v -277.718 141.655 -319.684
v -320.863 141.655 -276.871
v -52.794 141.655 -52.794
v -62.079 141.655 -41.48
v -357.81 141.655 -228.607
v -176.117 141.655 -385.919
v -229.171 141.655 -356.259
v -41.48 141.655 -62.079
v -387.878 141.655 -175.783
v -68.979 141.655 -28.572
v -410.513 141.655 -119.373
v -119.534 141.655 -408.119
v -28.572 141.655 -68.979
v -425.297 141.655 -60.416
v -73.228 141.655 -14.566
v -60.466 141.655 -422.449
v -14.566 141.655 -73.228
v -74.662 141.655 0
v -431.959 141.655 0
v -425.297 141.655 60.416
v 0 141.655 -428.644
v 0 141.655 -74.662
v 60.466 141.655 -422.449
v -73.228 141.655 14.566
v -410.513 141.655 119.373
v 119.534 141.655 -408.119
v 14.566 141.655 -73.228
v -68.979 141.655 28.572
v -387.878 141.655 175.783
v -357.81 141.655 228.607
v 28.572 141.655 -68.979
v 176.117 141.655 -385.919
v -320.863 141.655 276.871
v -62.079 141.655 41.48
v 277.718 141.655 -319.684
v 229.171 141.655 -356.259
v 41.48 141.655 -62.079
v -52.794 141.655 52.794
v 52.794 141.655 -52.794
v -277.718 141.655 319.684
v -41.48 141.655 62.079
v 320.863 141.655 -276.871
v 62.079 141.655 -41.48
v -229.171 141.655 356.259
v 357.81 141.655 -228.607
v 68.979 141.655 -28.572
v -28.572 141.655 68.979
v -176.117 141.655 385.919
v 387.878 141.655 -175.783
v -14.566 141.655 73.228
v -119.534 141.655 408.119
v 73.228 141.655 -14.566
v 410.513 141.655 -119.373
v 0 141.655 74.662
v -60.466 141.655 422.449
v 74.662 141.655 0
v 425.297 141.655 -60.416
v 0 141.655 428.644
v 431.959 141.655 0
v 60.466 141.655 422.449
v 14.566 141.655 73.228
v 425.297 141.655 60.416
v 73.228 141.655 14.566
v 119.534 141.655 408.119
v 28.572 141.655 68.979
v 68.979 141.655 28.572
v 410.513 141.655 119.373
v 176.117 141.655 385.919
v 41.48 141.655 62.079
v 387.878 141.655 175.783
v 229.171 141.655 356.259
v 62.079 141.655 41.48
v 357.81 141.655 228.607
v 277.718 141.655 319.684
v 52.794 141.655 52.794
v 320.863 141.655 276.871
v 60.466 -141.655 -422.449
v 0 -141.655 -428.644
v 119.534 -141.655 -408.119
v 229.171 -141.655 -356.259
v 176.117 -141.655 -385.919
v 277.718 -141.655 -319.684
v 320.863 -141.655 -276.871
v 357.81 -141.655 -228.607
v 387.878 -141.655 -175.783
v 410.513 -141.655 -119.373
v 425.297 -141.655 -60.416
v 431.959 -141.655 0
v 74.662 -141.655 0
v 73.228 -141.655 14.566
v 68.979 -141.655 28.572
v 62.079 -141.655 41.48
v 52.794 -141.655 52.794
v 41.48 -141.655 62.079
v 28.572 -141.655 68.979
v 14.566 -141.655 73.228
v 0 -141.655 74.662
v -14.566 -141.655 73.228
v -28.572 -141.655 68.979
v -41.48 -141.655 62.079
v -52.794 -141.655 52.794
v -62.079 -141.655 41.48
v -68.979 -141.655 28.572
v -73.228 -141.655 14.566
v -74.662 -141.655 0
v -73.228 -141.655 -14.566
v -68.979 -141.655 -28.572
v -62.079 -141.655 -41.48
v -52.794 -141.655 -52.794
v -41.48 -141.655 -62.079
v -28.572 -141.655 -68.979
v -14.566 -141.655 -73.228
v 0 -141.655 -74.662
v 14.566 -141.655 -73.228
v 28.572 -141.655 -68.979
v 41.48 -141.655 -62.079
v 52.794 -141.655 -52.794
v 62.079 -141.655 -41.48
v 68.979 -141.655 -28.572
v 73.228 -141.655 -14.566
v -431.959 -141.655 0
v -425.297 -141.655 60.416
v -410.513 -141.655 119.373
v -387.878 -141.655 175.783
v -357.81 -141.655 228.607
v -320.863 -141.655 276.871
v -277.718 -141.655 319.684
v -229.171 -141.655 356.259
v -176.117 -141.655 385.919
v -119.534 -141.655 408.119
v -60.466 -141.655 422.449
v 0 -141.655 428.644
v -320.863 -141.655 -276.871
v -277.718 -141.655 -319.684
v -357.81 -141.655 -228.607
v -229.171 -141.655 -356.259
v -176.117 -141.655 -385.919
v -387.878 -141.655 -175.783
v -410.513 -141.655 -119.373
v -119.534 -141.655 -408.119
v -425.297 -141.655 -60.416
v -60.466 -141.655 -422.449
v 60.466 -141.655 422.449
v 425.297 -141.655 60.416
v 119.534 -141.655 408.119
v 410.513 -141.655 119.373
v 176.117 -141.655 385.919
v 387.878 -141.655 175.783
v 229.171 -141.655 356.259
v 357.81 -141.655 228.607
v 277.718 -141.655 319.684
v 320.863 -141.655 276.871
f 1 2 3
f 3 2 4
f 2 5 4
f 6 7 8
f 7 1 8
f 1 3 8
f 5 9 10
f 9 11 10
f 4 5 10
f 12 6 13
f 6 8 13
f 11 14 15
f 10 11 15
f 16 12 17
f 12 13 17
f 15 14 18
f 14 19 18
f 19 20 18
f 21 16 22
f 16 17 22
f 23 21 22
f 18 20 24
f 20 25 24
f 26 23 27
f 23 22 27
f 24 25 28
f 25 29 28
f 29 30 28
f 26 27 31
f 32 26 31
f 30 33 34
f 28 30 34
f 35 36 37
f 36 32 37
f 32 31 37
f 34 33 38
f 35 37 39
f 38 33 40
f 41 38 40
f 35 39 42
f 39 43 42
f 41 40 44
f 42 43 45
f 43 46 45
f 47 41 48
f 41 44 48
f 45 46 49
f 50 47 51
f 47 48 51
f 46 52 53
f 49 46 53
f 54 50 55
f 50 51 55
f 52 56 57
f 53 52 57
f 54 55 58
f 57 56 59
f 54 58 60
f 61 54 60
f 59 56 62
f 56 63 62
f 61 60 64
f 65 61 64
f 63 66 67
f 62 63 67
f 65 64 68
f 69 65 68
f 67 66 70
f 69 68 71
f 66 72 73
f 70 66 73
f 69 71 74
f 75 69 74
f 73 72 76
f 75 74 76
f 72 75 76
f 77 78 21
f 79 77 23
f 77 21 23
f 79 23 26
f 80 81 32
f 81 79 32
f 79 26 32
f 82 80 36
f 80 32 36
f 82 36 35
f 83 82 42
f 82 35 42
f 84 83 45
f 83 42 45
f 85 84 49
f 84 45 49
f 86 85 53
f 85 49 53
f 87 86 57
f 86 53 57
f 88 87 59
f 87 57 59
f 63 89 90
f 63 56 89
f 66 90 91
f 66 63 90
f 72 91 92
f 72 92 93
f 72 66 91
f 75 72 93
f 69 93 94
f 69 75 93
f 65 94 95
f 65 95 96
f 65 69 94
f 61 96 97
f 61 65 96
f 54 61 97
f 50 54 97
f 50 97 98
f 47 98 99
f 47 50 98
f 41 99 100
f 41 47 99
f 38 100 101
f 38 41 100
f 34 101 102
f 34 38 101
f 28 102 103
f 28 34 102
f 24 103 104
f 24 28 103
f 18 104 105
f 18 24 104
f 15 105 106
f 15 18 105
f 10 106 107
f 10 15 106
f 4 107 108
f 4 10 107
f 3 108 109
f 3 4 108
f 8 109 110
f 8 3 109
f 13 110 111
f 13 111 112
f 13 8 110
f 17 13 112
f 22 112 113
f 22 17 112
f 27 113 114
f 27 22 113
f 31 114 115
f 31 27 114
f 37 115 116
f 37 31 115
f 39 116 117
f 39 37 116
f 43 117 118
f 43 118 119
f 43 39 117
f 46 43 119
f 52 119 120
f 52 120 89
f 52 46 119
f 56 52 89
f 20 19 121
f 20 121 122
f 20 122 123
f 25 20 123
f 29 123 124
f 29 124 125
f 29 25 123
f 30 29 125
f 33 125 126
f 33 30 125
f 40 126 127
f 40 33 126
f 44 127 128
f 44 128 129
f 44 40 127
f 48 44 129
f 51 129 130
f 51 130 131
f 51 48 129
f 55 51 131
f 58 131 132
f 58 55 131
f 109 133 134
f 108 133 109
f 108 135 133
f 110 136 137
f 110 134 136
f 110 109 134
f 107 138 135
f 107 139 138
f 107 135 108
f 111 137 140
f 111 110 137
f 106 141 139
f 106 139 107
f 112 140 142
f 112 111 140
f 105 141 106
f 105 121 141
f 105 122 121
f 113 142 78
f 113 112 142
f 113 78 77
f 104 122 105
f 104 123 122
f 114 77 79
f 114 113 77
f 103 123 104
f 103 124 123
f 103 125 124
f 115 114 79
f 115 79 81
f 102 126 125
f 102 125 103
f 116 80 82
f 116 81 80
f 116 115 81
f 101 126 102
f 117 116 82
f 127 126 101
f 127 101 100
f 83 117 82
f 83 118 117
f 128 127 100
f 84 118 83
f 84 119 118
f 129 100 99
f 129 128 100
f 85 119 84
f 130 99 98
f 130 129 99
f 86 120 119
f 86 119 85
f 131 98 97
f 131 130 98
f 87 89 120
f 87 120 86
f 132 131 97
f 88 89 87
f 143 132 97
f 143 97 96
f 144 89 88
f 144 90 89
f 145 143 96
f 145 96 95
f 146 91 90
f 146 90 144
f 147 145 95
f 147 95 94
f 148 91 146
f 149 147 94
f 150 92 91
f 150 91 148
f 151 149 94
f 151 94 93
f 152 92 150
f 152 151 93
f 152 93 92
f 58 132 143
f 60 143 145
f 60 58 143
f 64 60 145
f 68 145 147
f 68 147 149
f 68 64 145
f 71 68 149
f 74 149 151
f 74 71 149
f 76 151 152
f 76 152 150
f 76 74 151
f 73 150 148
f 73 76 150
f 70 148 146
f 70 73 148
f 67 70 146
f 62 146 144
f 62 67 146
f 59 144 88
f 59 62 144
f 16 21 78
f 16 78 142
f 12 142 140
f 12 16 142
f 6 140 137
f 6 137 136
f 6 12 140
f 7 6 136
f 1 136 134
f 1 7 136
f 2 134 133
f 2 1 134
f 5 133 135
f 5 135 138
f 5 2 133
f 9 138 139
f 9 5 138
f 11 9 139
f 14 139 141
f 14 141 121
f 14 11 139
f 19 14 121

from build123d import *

# Parameters (mm, degrees)
F1_W        = 864.7019863129
F1_H        = 857.8115701675
F1_R        = 74.6623748118
F2_DEPTH    = 141.6553631425
F3_T1_DEPTH = 2521.5281199611


# Not quite as in the source:
# - a fillet or chamfer that OpenCascade refuses, or shapes differently, is made with other operations: its cross-section is extruded or revolved along the edge and cut away or added


with BuildPart() as f2:
    # F1 (on face) → F2 (new body, symmetric)
    with BuildSketch(Plane.XZ):
        Rectangle(F1_W, F1_H)
        Circle(F1_R, mode=Mode.SUBTRACT)
    extrude(amount=F2_DEPTH, both=True)

    # F3: fillet of radius 447.6434787352 on 4 edges, made by hand

    # F3_s2 → F3_t1 (cut)
    with BuildSketch(Plane.XZ.offset(-1260.7640599805)):
        with BuildLine():
            ThreePointArc((-15.2924855788, 428.9057850838), (301.2392537888, 297.7940457162), (432.3509931564, -18.7376936514))
            Line((432.3509931564, -18.7376936514), (432.3509931564, 428.9057850838))
            Line((432.3509931564, 428.9057850838), (-15.2924855788, 428.9057850838))
        make_face()
        with BuildLine():
            ThreePointArc((-15.2924855788, -428.9057850838), (301.2392537888, -297.7940457162), (432.3509931564, 18.7376936514))
            Line((432.3509931564, 18.7376936514), (432.3509931564, -428.9057850838))
            Line((432.3509931564, -428.9057850838), (-15.2924855788, -428.9057850838))
        make_face()
        with BuildLine():
            ThreePointArc((15.2924855788, -428.9057850838), (-301.2392537888, -297.7940457162), (-432.3509931564, 18.7376936514))
            Line((-432.3509931564, 18.7376936514), (-432.3509931564, -428.9057850838))
            Line((-432.3509931564, -428.9057850838), (15.2924855788, -428.9057850838))
        make_face()
        with BuildLine():
            ThreePointArc((-432.3509931564, -18.7376936514), (-301.2392537888, 297.7940457162), (15.2924855788, 428.9057850838))
            Line((15.2924855788, 428.9057850838), (-432.3509931564, 428.9057850838))
            Line((-432.3509931564, 428.9057850838), (-432.3509931564, -18.7376936514))
        make_face()
    extrude(amount=F3_T1_DEPTH, mode=Mode.SUBTRACT)


solid = f2.part
